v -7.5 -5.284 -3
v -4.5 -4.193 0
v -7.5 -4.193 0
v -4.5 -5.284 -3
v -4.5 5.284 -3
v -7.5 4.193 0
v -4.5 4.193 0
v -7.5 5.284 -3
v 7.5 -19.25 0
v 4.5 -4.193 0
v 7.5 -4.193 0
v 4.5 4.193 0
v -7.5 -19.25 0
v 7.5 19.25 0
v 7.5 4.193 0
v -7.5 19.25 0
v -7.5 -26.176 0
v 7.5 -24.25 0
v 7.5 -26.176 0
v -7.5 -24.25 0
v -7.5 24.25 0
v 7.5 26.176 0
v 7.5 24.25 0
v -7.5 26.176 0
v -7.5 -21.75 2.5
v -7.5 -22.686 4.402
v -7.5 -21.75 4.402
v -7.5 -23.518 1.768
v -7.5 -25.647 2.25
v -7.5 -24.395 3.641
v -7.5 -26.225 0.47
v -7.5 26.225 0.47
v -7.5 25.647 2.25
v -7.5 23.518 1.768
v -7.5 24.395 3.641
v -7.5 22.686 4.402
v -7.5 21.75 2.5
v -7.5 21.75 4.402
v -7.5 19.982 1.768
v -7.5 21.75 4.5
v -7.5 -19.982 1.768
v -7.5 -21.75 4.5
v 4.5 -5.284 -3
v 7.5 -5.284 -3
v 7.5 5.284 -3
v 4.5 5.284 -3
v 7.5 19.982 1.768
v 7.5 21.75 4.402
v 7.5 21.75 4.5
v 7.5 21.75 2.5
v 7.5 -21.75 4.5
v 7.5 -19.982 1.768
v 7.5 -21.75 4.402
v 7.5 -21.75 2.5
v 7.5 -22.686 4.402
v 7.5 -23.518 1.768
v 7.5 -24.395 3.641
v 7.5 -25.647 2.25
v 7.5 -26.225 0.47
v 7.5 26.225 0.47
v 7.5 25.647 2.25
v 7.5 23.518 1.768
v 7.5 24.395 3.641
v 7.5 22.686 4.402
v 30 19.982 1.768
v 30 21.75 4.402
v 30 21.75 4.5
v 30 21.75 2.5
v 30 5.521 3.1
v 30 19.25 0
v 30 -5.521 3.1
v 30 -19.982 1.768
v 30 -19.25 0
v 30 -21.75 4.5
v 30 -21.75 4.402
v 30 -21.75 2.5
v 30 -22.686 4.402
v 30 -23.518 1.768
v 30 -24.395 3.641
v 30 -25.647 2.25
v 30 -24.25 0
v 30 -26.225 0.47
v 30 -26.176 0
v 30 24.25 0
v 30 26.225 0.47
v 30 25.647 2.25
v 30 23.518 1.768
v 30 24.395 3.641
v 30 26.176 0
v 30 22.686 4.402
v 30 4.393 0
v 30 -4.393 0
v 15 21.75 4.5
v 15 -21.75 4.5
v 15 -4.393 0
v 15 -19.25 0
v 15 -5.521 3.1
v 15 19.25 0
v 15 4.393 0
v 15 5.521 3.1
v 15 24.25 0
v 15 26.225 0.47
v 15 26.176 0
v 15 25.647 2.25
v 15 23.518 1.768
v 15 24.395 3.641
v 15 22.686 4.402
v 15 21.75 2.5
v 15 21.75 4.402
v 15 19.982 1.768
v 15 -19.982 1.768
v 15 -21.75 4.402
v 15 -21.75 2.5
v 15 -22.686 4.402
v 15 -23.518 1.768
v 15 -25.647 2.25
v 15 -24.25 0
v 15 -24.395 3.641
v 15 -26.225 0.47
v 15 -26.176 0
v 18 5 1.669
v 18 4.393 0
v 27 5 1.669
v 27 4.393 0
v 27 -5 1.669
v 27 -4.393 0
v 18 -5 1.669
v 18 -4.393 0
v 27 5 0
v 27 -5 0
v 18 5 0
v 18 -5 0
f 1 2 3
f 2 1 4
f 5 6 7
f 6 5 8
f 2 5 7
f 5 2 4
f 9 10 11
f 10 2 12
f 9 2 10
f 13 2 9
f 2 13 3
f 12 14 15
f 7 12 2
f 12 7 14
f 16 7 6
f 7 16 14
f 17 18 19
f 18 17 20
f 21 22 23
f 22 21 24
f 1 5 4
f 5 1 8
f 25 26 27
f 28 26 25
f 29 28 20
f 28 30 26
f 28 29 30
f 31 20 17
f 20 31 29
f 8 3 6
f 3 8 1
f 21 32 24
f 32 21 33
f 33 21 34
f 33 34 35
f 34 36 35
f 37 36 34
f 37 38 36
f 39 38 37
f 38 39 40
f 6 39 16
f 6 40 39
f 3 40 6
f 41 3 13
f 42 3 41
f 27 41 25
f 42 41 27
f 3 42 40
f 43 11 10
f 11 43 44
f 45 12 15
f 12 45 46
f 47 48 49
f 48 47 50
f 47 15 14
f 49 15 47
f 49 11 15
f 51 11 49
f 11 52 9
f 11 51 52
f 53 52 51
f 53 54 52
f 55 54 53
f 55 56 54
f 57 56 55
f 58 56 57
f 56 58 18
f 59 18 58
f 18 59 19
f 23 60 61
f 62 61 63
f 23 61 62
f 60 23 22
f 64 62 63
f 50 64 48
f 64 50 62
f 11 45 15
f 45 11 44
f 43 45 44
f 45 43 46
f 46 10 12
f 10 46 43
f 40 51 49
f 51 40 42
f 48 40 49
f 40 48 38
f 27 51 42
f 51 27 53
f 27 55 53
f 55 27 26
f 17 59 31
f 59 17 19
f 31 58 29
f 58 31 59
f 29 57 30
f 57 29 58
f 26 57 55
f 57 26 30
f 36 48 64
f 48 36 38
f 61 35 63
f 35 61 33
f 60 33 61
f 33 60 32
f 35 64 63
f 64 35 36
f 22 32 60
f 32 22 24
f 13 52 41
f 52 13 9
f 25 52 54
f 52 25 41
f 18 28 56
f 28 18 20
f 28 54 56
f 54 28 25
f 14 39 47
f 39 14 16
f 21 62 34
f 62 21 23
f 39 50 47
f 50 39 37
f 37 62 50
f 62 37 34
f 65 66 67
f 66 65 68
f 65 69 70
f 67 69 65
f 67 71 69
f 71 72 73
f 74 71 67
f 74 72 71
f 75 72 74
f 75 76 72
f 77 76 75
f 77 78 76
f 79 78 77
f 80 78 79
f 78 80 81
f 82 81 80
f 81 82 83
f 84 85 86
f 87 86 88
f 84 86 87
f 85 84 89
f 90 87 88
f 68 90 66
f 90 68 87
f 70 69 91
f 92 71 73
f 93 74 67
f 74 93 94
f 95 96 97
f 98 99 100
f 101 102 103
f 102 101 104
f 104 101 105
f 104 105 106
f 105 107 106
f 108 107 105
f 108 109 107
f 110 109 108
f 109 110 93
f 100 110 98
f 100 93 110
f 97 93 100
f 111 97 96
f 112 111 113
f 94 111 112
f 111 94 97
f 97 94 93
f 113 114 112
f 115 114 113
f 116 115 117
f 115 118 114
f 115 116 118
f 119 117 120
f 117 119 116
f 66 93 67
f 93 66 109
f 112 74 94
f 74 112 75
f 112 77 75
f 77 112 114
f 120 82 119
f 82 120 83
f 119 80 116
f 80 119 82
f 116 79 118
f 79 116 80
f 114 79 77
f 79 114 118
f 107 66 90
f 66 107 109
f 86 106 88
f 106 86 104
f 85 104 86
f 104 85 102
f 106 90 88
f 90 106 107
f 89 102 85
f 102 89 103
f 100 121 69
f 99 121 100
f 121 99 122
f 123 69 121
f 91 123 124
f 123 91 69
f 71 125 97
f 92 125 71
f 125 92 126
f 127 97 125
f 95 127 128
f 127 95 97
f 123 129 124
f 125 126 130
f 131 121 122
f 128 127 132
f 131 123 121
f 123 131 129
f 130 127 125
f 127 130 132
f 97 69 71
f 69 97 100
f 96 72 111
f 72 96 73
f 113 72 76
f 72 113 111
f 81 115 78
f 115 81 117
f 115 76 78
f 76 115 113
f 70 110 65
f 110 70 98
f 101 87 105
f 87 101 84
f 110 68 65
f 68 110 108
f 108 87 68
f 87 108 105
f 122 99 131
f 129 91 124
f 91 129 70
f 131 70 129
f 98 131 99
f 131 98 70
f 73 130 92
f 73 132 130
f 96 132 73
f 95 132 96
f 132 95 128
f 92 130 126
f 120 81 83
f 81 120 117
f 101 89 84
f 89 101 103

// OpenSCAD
x = 15; // [10:50]
y = 43.5; // [25:75]
z = 9; // [5:15]


union() { 

intersection() { translate(v = [-(x-3)/2, 0, -(z/6)]) cube(size = [3,(y+20),(z/3)], center = true);
union() { translate(v = [-(x-3)/2, -1, 0]) rotate(a=[70,0,0]) cube(size = [10,(y+20),(z/1.5)], center = true);
translate(v = [-(x-3)/2, 1, 0]) rotate(a=[-70,0,0]) cube(size = [10,(y+20),(z/1.5)], center = true); } }

intersection() { translate(v = [(x-3)/2, 0, -(z/6)]) cube(size = [3,(y+20),(z/3)], center = true);
union() { translate(v = [(x-3)/2, -1, 0]) rotate(a=[70,0,0]) cube(size = [10,(y+20),(z/1.5)], center = true);
translate(v = [(x-3)/2, 1, 0]) rotate(a=[-70,0,0]) cube(size = [10,(y+20),(z/1.5)], center = true); } }


difference() { union() { cube(size = [x,y,z], center = true);
translate(v = [0, -(y/2), 0]) rotate(a=[90,90,90]) cylinder(h = x, r=(z/2), center = true);
translate(v = [0, (y/2), 0]) rotate(a=[90,90,90]) cylinder(h = x, r=(z/2), center = true); }

union() { translate(v = [0, -(y/2), 0]) rotate(a=[90,90,90]) cylinder(h = (x+10), r=(z/3.6), center = true);
translate(v = [0, (y/2), 0]) rotate(a=[90,90,90]) cylinder(h = (x+10), r=(z/3.6), center = true); 

translate(v = [0, 0, -(z/4)-1]) cube(size = [(x+40),(y+40),(z/2)+2], center = true); } } }



difference() { 

union() { translate(v = [x+(x/2), 0, 0]) cube(size = [x,y,z], center = true);

translate(v = [x+(x/2), -(y/2), 0]) rotate(a=[90,90,90]) cylinder(h = x, r=(z/2), center = true);

translate(v = [x+(x/2), (y/2), 0]) rotate(a=[90,90,90]) cylinder(h = x, r=(z/2), center = true); }

union() { translate(v = [x+(x/2), -(y/2), 0]) rotate(a=[90,90,90]) cylinder(h = (x+5), r=(z/3.6), center = true);

translate(v = [x+(x/2), (y/2), 0]) rotate(a=[90,90,90]) cylinder(h = (x+5), r=(z/3.6), center = true); 

translate(v = [x+(x/2), 0, -(z/4)-1]) cube(size = [(x+40),(y+40),(z/2)+2], center = true);

intersection() { translate(v = [x+(x/2), 0, z/6]) cube(size = [(x+5),(y+11),(z/3)+0.2], center = true);

union() { translate(v = [x+(x/2), 1.2, 0]) rotate(a=[70,0,0]) cube(size = [(x+5),(y+11),(z/1.5)], center = true);

translate(v = [x+(x/2), -1.2, 0]) rotate(a=[-70,0,0]) cube(size = [(x+5),(y+11),(z/1.5)], center = true);

translate(v = [x+(x/2), 0, 1]) cube(size = [(x-6),(z+1),(z/3)+0.2], center = true); } }

}

}
